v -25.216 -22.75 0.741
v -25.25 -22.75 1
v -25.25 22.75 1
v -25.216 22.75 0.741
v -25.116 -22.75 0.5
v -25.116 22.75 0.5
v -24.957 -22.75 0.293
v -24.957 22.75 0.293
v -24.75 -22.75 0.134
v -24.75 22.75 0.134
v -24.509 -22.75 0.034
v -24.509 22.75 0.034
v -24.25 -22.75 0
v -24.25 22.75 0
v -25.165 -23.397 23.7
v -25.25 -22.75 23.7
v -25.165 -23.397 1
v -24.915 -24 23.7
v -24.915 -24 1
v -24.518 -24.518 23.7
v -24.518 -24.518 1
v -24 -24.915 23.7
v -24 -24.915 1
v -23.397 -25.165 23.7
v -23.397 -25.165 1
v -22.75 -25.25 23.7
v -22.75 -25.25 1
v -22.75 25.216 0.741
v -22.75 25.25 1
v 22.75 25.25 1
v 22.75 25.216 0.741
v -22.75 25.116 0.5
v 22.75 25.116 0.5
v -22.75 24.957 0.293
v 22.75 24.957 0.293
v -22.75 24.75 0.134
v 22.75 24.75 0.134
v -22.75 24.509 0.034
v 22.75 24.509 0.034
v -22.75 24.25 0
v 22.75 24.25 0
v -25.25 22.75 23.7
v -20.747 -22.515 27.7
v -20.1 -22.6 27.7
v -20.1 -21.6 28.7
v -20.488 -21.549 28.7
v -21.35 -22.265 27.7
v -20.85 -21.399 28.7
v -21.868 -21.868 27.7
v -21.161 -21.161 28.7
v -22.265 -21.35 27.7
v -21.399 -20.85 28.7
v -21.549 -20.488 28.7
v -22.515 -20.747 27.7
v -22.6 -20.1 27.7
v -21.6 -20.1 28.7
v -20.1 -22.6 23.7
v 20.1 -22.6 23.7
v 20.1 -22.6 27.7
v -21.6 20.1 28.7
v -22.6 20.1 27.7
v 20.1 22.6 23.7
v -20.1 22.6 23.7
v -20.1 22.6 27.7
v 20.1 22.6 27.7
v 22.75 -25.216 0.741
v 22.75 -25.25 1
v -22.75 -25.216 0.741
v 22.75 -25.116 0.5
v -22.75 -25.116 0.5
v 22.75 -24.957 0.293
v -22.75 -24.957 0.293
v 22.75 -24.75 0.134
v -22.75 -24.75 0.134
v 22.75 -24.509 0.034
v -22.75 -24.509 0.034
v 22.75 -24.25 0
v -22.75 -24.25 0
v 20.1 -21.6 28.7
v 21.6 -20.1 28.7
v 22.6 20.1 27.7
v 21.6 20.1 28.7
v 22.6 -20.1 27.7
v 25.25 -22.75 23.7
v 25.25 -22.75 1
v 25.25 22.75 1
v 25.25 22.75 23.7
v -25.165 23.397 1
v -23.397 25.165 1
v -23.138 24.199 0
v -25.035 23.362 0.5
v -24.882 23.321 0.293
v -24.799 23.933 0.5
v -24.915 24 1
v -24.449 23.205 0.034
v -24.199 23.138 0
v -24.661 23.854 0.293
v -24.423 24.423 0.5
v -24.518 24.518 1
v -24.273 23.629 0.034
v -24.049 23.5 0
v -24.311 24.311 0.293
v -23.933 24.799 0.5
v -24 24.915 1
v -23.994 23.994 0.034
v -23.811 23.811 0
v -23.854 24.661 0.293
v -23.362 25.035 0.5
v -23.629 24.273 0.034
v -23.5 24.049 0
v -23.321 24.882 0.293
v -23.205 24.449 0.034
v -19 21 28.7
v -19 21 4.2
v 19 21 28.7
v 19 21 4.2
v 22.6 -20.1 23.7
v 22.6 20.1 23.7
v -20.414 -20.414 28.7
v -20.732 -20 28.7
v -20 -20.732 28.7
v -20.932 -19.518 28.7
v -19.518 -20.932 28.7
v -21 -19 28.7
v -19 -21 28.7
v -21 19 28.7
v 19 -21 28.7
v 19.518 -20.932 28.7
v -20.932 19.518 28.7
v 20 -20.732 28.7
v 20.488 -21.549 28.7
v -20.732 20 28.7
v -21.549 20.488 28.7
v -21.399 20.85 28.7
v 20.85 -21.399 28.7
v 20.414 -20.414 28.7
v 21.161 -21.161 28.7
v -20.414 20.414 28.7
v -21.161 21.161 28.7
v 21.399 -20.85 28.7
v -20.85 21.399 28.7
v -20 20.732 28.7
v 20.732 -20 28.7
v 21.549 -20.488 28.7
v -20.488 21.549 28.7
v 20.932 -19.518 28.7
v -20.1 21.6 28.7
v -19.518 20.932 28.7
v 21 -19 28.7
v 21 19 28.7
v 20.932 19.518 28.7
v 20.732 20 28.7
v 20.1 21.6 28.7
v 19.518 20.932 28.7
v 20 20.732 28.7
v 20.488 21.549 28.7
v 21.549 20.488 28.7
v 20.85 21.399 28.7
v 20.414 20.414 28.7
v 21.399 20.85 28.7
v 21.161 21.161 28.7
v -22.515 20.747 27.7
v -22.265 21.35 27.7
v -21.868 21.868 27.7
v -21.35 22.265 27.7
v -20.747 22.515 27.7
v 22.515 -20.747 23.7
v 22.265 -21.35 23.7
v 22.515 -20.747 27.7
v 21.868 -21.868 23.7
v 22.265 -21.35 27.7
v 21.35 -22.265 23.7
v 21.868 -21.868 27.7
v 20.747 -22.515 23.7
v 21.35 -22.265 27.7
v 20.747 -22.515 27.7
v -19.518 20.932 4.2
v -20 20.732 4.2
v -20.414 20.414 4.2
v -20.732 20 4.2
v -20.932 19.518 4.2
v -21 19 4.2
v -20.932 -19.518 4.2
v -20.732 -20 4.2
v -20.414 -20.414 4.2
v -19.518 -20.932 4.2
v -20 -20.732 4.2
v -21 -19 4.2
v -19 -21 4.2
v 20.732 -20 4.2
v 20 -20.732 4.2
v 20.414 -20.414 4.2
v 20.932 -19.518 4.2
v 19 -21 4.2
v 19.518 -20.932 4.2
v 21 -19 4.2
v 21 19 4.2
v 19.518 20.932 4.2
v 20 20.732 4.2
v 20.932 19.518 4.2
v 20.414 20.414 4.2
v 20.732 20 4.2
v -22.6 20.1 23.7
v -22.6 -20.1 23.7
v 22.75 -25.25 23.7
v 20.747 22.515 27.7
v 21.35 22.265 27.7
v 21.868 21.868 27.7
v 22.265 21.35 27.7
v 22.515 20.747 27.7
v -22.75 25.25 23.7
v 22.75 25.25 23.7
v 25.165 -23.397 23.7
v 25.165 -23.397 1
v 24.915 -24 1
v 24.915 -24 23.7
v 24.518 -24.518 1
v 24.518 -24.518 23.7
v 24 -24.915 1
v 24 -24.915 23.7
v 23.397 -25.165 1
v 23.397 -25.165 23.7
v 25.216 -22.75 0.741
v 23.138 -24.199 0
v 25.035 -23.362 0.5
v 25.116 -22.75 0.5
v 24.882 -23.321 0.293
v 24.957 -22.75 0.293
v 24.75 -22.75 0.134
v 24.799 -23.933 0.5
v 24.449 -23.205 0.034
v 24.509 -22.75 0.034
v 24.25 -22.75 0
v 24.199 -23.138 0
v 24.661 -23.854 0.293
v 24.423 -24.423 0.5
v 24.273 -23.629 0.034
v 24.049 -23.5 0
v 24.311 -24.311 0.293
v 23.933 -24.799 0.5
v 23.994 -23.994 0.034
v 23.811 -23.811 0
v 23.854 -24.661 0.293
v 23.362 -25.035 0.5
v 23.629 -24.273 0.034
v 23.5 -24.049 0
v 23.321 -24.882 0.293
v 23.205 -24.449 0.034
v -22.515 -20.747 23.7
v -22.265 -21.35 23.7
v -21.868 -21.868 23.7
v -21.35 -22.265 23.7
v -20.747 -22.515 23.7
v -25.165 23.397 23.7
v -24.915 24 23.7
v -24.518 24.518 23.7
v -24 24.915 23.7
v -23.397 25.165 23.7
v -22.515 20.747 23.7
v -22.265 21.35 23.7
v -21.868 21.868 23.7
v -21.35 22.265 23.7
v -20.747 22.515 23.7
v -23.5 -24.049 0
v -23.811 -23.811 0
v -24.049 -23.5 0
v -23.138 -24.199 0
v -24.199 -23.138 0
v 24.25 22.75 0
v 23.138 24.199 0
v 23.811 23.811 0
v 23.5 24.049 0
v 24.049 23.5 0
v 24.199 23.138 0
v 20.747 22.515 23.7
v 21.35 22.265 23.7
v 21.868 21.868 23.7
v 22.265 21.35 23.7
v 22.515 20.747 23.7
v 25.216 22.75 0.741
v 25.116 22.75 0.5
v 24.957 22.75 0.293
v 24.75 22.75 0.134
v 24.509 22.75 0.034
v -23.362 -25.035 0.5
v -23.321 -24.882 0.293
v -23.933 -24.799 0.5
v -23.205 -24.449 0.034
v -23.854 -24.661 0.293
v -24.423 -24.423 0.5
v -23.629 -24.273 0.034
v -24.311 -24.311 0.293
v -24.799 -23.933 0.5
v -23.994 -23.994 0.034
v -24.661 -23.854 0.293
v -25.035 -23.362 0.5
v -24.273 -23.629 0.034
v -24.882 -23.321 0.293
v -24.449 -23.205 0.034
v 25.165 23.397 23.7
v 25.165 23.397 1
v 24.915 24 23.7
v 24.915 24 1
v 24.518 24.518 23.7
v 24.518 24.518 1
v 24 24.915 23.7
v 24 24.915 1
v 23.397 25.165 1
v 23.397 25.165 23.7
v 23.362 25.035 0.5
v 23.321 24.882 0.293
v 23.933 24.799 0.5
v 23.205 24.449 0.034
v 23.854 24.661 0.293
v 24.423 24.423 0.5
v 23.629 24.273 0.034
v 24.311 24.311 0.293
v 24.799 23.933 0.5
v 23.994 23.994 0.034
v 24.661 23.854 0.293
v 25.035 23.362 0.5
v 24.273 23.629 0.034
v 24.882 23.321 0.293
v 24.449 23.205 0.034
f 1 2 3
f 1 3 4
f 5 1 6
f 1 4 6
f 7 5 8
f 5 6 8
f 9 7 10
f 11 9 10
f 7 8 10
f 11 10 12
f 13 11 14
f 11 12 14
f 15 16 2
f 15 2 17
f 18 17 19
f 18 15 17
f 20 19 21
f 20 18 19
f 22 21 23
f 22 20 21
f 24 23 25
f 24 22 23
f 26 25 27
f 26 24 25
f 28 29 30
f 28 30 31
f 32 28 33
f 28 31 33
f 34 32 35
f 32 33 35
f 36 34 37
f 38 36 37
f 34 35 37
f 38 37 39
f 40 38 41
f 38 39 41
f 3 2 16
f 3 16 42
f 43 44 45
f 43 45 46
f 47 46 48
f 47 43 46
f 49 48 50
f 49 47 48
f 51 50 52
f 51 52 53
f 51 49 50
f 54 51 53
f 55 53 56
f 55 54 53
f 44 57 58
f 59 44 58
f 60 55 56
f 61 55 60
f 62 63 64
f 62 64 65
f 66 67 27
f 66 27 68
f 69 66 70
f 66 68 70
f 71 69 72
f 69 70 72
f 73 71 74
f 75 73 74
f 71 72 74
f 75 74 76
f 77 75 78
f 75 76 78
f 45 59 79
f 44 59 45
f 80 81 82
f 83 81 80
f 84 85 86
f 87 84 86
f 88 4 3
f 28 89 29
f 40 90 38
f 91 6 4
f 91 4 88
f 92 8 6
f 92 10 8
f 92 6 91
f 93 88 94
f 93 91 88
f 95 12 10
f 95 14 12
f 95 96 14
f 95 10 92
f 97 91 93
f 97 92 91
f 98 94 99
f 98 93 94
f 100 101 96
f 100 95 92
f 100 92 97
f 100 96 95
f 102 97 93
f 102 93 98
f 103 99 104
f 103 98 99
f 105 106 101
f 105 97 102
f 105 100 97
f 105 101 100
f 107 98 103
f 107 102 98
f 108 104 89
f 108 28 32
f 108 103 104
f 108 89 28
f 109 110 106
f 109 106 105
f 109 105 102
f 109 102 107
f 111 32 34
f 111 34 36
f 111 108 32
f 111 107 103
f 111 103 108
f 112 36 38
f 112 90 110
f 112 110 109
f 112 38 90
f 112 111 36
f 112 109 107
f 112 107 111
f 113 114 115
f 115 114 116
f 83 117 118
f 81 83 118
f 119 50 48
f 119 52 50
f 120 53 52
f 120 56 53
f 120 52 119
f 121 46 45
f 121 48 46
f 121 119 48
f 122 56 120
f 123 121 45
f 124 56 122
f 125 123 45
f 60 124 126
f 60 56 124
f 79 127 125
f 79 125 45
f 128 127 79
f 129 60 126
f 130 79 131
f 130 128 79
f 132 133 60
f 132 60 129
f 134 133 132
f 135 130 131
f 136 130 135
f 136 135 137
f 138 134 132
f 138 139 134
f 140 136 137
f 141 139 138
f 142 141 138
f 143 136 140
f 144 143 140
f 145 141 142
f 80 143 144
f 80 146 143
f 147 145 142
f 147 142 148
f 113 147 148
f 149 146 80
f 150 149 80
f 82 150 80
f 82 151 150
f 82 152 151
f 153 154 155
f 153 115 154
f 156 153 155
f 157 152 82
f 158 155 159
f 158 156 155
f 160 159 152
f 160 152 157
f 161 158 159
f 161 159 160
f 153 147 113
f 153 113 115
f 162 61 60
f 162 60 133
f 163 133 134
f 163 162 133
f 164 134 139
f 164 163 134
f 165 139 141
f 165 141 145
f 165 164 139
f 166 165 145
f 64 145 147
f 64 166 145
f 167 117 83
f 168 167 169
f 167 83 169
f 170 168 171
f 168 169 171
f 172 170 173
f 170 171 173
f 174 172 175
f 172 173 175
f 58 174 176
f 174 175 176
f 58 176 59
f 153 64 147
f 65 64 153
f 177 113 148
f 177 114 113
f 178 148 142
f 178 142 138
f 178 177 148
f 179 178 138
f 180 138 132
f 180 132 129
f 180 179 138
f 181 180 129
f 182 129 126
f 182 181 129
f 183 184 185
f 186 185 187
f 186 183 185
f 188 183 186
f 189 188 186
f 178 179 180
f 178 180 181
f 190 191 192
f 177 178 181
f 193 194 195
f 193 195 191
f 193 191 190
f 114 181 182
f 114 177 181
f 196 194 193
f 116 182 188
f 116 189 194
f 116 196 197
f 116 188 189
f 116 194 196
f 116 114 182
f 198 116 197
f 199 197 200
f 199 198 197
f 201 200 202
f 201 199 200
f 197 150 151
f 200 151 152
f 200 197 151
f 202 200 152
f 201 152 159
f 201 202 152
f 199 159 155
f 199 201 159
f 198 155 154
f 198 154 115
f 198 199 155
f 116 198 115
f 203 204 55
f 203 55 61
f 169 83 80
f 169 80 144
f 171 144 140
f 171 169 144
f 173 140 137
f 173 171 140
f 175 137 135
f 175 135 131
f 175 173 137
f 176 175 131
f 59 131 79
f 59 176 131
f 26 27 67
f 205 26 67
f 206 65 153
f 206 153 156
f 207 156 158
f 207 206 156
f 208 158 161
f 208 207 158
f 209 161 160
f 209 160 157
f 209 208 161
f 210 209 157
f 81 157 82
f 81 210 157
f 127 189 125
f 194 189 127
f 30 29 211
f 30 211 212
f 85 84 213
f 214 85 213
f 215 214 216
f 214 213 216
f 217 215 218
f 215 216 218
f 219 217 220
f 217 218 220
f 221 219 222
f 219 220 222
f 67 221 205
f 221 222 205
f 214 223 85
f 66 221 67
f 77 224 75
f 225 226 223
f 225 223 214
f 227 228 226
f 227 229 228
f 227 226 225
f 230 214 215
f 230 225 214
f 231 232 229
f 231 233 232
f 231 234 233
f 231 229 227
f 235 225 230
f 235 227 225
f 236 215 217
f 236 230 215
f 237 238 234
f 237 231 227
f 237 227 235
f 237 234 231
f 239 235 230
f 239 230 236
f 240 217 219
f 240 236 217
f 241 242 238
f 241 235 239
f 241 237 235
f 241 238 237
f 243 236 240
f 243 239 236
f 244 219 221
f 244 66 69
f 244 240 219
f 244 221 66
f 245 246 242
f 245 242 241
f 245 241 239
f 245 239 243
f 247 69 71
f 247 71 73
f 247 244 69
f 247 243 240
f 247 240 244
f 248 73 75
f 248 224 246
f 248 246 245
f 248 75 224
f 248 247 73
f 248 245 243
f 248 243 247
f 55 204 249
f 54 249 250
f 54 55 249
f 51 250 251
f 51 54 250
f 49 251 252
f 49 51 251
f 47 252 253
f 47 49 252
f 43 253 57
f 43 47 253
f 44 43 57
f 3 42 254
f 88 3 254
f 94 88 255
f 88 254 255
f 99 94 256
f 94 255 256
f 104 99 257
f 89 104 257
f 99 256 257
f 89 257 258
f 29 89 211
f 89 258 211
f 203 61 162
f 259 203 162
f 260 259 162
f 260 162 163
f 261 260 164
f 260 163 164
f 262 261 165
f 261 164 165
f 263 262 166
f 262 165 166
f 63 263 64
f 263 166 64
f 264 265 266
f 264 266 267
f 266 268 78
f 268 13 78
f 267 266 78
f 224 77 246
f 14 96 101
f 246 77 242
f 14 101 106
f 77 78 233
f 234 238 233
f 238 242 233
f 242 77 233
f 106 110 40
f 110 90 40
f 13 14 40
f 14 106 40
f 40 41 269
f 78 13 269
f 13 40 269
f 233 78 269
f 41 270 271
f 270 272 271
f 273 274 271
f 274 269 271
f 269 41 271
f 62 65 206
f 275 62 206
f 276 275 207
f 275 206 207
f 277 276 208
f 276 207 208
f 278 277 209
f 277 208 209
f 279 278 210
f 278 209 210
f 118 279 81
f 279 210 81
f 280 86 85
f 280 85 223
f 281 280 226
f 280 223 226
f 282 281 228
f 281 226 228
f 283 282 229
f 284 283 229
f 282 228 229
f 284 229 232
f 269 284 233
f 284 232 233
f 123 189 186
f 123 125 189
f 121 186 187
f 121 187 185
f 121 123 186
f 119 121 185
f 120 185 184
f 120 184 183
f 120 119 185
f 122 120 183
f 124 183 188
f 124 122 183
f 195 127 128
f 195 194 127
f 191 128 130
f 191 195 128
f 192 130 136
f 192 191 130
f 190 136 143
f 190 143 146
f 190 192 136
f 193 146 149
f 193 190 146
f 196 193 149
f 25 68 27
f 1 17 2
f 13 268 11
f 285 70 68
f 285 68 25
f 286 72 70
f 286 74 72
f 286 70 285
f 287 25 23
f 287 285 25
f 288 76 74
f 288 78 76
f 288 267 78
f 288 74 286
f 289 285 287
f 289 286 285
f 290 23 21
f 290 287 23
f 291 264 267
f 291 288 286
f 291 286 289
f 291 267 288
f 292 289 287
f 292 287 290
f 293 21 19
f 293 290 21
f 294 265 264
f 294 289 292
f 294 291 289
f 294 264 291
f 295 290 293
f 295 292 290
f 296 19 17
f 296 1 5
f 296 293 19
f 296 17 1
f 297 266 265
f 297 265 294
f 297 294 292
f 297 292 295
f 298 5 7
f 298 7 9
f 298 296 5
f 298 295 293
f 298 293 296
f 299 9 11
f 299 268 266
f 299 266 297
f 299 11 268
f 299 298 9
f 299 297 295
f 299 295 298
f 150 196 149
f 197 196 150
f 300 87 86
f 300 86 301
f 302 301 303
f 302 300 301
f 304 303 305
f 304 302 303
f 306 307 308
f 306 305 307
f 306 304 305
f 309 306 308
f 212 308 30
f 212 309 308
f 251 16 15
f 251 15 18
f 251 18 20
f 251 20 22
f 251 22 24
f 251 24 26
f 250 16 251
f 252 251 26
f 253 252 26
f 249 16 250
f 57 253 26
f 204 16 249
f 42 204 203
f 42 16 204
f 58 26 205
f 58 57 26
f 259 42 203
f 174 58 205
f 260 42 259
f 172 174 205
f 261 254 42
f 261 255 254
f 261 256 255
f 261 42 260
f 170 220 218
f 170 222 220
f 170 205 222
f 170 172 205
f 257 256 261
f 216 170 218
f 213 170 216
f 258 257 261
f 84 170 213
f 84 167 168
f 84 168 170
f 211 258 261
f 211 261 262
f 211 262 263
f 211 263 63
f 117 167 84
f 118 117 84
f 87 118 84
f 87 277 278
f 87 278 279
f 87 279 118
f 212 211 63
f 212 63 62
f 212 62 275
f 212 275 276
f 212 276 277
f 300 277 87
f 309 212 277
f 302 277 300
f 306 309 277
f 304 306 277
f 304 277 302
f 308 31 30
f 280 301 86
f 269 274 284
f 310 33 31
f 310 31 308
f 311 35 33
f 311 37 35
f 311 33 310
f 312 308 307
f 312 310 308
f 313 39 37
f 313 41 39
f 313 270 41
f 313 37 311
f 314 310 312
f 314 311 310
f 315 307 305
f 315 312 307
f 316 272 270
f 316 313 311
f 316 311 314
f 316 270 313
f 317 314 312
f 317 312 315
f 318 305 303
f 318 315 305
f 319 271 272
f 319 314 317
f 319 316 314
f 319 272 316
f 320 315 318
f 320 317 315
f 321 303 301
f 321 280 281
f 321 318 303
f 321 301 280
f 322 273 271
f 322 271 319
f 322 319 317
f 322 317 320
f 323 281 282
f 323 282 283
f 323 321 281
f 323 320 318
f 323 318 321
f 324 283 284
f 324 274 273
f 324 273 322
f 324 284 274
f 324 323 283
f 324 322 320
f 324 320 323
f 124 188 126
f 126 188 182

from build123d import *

# Parameters (mm, degrees)
F0_W          = 50.5
F0_H          = 50.5
F1_DEPTH      = 23.7
F2_W          = 45.2
F2_H          = 45.2
F3_DEPTH      = 5
F4_W          = 42
F4_H          = 42
F5_DEPTH      = 5
F5_DEPTH_BACK = 19.5
F6_R          = 2.5
F7_R          = 2
F8_SIZE       = 1
F9_R          = 1


with BuildPart() as f1:
    # F0 (on Top) → F1 (new body)
    with BuildSketch(Plane.XY):
        Rectangle(F0_W, F0_H)
    extrude(amount=F1_DEPTH)

    # F2 (on face) → F3 (join)
    with BuildSketch(Plane.XY.offset(23.7)):
        Rectangle(F2_W, F2_H)
    extrude(amount=F3_DEPTH)

    # F4 (on face) → F5 (cut, two sides)
    with BuildSketch(Plane.XY.offset(23.7)) as f5_sk:
        Rectangle(F4_W, F4_H)
    extrude(amount=F5_DEPTH, mode=Mode.SUBTRACT)
    extrude(f5_sk.sketch, amount=-F5_DEPTH_BACK, mode=Mode.SUBTRACT)

    # F6
    f6_edges = [f1.edges().sort_by_distance(p)[0] for p in [
        (-25.25, 25.25, 11.85),
        (-25.25, -25.25, 11.85),
        (25.25, -25.25, 11.85),
        (25.25, 25.25, 11.85),
        (-22.6, 22.6, 26.2),
        (-22.6, -22.6, 26.2),
        (22.6, -22.6, 26.2),
        (22.6, 22.6, 26.2),
    ]]
    fillet(f6_edges, radius=F6_R)

    # F7
    f7_edges = [f1.edges().sort_by_distance(p)[0] for p in [
        (-21, 21, 16.45),
        (21, 21, 16.45),
        (21, -21, 16.45),
        (-21, -21, 16.45),
    ]]
    fillet(f7_edges, radius=F7_R)

    # F8
    f8_edges = [f1.edges().sort_by_distance(p)[0] for p in [
        (-22.6, 0, 28.7),
    ]]
    chamfer(f8_edges, length=F8_SIZE)

    # F9
    f9_edges = [f1.edges().sort_by_distance(p)[0] for p in [
        (0, 25.25, 0),
    ]]
    fillet(f9_edges, radius=F9_R)


solid = f1.part
